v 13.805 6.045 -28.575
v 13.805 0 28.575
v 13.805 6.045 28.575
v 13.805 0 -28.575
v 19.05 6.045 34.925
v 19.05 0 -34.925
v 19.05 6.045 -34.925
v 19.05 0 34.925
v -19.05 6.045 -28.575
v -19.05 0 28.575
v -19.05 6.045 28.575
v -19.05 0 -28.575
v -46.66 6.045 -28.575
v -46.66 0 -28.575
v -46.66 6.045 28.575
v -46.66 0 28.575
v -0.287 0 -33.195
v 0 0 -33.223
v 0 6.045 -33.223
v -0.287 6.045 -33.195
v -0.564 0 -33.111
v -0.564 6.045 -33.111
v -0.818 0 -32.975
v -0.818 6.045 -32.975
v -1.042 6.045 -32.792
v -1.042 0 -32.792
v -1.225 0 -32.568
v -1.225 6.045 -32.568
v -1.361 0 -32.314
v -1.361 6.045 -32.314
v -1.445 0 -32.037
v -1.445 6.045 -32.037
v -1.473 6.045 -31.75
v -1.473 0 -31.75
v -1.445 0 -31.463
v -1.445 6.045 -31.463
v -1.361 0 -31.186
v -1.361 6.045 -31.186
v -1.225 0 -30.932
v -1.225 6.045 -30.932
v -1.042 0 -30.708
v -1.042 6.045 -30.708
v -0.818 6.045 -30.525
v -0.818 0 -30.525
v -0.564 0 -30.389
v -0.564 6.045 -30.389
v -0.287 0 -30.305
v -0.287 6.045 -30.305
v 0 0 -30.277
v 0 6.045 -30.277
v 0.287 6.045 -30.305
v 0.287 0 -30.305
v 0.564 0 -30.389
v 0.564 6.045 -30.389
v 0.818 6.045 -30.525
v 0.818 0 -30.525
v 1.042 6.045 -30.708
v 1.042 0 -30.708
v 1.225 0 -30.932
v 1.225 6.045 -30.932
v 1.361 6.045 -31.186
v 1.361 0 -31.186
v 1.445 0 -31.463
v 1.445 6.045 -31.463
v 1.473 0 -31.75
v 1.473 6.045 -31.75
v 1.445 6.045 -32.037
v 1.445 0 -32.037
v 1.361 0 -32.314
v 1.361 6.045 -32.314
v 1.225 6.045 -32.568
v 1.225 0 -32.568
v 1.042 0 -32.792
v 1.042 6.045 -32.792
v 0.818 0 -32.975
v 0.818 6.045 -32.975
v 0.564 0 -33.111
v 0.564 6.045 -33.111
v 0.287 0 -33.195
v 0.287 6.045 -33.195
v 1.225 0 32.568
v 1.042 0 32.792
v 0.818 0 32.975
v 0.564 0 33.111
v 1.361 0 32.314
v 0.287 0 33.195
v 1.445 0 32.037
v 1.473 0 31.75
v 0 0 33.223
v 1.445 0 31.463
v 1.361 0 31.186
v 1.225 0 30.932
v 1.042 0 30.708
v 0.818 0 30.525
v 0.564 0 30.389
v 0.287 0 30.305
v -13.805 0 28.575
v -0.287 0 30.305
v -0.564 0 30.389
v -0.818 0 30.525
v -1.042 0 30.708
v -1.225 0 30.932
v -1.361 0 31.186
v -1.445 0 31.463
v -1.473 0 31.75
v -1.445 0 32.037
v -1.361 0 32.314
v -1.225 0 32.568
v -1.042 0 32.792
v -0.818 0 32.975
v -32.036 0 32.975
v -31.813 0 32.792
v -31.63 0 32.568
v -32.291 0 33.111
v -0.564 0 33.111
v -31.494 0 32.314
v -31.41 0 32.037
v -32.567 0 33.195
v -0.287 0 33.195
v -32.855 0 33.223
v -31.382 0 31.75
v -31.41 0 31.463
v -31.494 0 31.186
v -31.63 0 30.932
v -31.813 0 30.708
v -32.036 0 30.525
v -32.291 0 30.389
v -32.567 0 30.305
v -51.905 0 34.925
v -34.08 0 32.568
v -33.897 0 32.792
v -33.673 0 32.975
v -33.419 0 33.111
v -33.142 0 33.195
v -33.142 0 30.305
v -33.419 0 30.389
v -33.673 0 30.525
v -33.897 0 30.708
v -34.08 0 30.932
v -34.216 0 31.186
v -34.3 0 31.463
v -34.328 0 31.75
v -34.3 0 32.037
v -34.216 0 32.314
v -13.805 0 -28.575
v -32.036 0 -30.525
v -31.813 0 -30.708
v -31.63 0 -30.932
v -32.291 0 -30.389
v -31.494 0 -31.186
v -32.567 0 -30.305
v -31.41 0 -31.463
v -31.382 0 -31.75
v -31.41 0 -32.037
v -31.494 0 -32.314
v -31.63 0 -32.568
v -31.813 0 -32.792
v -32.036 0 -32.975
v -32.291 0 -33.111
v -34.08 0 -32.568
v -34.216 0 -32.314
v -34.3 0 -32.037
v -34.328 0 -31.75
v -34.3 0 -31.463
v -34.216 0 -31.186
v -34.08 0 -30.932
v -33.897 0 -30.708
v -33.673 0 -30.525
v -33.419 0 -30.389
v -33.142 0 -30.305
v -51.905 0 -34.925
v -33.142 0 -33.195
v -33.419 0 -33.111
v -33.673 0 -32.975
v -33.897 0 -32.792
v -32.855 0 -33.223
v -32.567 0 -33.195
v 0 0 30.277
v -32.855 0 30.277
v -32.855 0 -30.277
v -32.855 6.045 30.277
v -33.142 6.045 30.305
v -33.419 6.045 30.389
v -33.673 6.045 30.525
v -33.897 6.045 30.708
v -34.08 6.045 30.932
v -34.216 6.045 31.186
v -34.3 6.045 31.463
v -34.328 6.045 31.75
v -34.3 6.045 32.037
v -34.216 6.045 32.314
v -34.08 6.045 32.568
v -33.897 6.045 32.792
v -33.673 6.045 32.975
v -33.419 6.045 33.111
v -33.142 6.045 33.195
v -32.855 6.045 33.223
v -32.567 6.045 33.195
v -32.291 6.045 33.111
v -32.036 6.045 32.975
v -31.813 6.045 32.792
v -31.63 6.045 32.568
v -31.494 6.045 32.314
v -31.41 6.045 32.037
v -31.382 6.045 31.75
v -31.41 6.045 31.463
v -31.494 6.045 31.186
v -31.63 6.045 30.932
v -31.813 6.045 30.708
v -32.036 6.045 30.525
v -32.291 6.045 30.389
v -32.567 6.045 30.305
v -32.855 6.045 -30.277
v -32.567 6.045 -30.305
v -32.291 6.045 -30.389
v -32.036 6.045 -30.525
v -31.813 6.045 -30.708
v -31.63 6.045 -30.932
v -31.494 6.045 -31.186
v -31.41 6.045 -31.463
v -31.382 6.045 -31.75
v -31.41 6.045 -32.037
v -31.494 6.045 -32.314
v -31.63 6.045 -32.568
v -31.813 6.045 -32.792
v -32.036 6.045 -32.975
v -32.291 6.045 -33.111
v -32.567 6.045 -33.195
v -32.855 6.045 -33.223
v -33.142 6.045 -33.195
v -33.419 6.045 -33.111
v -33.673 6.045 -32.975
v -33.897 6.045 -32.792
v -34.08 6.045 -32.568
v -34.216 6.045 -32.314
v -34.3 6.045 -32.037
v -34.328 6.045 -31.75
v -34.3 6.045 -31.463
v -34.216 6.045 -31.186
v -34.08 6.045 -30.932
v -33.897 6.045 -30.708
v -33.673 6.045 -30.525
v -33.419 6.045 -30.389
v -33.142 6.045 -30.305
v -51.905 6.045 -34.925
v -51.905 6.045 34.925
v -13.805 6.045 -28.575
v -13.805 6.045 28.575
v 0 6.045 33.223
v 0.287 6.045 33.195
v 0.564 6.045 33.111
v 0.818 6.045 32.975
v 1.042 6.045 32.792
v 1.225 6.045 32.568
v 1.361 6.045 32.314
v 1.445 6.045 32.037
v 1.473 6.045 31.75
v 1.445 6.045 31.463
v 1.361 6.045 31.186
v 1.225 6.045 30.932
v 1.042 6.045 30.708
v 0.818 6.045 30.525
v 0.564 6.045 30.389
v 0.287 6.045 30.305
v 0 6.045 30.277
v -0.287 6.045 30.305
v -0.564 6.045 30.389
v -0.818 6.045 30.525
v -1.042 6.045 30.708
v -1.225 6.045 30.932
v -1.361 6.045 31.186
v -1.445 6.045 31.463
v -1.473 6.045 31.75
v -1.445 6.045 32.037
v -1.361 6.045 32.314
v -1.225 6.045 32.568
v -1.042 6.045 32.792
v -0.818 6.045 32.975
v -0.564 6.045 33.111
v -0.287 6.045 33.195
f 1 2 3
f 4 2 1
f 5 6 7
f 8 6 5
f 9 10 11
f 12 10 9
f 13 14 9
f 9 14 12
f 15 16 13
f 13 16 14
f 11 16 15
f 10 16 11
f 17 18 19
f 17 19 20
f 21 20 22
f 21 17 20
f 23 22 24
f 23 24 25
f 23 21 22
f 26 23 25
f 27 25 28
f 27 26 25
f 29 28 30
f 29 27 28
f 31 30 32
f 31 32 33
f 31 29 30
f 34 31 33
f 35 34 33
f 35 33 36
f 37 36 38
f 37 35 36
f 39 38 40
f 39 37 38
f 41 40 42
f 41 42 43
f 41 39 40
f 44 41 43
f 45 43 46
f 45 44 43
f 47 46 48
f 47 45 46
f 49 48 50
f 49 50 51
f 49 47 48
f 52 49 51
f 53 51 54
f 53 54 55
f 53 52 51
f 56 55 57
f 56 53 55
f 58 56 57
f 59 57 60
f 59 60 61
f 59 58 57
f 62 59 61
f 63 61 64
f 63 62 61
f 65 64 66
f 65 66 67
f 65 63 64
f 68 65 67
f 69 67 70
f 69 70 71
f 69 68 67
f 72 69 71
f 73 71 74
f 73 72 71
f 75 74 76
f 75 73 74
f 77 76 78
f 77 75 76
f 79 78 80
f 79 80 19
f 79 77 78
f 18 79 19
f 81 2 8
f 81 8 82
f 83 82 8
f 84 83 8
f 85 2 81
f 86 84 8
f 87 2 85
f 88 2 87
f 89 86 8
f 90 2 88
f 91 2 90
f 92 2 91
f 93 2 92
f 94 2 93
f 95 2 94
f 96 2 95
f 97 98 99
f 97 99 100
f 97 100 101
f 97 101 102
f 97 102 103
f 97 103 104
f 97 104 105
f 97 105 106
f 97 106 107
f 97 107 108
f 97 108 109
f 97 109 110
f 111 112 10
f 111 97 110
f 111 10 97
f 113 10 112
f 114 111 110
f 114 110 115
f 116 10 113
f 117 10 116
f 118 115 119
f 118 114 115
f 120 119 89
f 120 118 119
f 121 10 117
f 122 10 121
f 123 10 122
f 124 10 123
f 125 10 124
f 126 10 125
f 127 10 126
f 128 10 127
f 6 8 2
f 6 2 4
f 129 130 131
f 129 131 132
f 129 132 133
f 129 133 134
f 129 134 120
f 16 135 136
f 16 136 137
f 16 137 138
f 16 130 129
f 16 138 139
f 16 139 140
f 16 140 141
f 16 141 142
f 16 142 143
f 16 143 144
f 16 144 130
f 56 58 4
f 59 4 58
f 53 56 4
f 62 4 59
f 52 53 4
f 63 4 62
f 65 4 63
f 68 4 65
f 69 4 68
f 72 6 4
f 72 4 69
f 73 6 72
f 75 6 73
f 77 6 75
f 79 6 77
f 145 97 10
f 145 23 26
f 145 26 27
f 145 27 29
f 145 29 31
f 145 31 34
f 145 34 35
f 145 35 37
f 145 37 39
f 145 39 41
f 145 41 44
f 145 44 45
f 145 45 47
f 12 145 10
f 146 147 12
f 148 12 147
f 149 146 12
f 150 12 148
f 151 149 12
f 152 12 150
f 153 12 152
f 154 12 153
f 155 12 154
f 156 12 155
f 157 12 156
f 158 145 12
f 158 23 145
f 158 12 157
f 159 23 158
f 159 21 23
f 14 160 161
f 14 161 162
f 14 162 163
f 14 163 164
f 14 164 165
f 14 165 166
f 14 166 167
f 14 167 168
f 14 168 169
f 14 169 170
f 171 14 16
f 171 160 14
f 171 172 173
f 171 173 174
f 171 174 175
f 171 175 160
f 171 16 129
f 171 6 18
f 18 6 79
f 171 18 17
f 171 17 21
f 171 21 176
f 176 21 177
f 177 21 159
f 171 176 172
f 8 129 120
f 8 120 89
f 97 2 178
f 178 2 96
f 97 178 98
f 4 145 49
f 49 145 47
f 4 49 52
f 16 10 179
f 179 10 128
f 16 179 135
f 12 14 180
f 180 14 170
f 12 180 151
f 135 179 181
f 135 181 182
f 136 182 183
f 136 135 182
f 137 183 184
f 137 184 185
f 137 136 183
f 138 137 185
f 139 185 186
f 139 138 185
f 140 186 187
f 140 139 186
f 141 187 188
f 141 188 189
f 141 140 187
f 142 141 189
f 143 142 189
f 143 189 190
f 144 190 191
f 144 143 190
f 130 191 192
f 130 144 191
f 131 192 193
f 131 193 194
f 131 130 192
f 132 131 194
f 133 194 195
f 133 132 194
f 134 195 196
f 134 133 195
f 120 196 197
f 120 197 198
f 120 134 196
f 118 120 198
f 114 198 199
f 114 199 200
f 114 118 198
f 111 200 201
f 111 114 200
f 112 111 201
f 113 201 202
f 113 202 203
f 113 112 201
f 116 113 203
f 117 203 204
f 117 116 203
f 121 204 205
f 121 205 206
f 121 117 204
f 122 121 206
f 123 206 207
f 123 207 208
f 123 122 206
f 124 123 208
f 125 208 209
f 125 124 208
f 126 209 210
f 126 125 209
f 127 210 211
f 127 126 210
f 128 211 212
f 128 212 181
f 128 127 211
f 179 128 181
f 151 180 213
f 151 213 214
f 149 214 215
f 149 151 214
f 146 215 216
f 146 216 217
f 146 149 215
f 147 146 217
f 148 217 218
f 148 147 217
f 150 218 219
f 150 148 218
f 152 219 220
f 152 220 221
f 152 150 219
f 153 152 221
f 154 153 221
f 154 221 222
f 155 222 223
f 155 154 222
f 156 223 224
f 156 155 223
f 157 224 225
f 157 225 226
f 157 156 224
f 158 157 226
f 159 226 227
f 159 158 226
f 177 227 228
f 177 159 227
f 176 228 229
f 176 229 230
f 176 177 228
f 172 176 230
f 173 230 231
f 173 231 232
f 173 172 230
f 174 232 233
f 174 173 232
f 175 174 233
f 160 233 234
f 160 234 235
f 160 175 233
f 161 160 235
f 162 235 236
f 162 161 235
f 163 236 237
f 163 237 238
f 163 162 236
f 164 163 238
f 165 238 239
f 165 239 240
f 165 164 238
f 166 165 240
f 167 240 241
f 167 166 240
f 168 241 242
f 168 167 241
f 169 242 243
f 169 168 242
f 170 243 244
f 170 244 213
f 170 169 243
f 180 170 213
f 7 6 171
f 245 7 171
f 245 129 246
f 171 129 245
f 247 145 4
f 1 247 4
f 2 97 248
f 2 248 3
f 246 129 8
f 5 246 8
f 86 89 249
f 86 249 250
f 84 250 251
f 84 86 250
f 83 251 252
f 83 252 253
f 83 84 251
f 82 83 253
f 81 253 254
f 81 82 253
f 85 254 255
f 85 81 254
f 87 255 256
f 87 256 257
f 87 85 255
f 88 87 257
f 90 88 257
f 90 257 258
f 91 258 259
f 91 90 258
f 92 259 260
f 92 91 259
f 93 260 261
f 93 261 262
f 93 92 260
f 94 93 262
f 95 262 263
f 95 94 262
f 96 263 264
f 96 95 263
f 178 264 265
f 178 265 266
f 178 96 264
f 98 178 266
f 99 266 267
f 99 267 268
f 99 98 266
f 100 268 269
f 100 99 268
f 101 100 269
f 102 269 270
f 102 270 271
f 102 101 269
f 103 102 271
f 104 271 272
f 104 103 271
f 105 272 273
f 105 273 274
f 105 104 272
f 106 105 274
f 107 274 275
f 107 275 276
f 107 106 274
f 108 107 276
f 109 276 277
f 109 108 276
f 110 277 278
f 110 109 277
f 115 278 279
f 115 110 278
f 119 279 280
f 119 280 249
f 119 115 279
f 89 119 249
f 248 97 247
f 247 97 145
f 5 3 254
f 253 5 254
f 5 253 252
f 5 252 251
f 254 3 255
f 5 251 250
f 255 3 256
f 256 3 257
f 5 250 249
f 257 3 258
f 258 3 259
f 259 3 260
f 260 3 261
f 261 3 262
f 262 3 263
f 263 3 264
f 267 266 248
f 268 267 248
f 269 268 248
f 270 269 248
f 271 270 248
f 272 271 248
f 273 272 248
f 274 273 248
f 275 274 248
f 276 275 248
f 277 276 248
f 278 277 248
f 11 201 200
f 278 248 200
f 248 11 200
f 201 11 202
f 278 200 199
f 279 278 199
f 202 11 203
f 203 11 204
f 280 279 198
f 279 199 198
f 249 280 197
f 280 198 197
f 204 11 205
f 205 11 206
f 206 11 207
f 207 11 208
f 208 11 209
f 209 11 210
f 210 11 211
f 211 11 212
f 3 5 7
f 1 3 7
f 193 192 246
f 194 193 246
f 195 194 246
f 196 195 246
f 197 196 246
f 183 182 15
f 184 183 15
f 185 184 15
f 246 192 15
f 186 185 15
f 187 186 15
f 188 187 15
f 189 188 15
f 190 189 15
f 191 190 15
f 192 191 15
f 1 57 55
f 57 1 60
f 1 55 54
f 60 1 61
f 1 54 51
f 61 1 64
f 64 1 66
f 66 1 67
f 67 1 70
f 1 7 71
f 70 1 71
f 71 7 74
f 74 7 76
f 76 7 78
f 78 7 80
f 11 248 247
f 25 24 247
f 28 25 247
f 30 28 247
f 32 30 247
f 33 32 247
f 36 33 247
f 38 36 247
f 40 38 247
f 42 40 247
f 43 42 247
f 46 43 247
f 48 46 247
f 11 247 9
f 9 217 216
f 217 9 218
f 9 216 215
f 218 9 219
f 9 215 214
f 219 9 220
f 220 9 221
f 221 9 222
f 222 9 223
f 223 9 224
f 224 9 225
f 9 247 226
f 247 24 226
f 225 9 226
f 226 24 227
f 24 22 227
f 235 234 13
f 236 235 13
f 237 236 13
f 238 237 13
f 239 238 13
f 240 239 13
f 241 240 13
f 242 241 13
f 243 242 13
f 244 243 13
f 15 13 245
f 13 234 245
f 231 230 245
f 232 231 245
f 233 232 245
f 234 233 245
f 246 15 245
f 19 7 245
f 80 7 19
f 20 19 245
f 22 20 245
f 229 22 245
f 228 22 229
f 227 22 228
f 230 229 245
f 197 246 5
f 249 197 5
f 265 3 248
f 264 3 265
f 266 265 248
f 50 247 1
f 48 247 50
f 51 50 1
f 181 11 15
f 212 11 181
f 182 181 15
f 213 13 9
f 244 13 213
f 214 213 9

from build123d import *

# Parameters (mm, degrees)
SKETCH2_R           = 1.4732
SKETCH2_W           = 27.6098
SKETCH2_H           = 57.15
BOSS_EXTRUDE1_DEPTH = 6.0452


with BuildPart() as part:
    # Sketch2 → Boss-Extrude1 (new body)
    with BuildSketch(Plane(origin=(0, 0, 0), x_dir=(1, 0, 0), z_dir=(0, 1, 0))):
        Polygon((-19.05, 34.925), (19.05, 34.925), (19.05, -34.925), (-19.05, -34.925), (-51.9049, -34.925), (-51.9049, 34.925), align=None)
        with Locations(Location((0, 31.75, 0), (0, 0, 90))):
            Circle(SKETCH2_R, mode=Mode.SUBTRACT)
        with Locations(Location((-32.8549, 31.75, 0), (0, 0, 270))):
            Circle(SKETCH2_R, mode=Mode.SUBTRACT)
        with Locations(Location((0, -31.75, 0), (0, 0, 270))):
            Circle(SKETCH2_R, mode=Mode.SUBTRACT)
        with Locations(Location((-32.8549, -31.75, 0), (0, 0, 90))):
            Circle(SKETCH2_R, mode=Mode.SUBTRACT)
        Rectangle(SKETCH2_W, SKETCH2_H, mode=Mode.SUBTRACT)
        with Locations((-32.8549, 0)):
            Rectangle(SKETCH2_W, SKETCH2_H, mode=Mode.SUBTRACT)
    extrude(amount=BOSS_EXTRUDE1_DEPTH)


solid = part.part
